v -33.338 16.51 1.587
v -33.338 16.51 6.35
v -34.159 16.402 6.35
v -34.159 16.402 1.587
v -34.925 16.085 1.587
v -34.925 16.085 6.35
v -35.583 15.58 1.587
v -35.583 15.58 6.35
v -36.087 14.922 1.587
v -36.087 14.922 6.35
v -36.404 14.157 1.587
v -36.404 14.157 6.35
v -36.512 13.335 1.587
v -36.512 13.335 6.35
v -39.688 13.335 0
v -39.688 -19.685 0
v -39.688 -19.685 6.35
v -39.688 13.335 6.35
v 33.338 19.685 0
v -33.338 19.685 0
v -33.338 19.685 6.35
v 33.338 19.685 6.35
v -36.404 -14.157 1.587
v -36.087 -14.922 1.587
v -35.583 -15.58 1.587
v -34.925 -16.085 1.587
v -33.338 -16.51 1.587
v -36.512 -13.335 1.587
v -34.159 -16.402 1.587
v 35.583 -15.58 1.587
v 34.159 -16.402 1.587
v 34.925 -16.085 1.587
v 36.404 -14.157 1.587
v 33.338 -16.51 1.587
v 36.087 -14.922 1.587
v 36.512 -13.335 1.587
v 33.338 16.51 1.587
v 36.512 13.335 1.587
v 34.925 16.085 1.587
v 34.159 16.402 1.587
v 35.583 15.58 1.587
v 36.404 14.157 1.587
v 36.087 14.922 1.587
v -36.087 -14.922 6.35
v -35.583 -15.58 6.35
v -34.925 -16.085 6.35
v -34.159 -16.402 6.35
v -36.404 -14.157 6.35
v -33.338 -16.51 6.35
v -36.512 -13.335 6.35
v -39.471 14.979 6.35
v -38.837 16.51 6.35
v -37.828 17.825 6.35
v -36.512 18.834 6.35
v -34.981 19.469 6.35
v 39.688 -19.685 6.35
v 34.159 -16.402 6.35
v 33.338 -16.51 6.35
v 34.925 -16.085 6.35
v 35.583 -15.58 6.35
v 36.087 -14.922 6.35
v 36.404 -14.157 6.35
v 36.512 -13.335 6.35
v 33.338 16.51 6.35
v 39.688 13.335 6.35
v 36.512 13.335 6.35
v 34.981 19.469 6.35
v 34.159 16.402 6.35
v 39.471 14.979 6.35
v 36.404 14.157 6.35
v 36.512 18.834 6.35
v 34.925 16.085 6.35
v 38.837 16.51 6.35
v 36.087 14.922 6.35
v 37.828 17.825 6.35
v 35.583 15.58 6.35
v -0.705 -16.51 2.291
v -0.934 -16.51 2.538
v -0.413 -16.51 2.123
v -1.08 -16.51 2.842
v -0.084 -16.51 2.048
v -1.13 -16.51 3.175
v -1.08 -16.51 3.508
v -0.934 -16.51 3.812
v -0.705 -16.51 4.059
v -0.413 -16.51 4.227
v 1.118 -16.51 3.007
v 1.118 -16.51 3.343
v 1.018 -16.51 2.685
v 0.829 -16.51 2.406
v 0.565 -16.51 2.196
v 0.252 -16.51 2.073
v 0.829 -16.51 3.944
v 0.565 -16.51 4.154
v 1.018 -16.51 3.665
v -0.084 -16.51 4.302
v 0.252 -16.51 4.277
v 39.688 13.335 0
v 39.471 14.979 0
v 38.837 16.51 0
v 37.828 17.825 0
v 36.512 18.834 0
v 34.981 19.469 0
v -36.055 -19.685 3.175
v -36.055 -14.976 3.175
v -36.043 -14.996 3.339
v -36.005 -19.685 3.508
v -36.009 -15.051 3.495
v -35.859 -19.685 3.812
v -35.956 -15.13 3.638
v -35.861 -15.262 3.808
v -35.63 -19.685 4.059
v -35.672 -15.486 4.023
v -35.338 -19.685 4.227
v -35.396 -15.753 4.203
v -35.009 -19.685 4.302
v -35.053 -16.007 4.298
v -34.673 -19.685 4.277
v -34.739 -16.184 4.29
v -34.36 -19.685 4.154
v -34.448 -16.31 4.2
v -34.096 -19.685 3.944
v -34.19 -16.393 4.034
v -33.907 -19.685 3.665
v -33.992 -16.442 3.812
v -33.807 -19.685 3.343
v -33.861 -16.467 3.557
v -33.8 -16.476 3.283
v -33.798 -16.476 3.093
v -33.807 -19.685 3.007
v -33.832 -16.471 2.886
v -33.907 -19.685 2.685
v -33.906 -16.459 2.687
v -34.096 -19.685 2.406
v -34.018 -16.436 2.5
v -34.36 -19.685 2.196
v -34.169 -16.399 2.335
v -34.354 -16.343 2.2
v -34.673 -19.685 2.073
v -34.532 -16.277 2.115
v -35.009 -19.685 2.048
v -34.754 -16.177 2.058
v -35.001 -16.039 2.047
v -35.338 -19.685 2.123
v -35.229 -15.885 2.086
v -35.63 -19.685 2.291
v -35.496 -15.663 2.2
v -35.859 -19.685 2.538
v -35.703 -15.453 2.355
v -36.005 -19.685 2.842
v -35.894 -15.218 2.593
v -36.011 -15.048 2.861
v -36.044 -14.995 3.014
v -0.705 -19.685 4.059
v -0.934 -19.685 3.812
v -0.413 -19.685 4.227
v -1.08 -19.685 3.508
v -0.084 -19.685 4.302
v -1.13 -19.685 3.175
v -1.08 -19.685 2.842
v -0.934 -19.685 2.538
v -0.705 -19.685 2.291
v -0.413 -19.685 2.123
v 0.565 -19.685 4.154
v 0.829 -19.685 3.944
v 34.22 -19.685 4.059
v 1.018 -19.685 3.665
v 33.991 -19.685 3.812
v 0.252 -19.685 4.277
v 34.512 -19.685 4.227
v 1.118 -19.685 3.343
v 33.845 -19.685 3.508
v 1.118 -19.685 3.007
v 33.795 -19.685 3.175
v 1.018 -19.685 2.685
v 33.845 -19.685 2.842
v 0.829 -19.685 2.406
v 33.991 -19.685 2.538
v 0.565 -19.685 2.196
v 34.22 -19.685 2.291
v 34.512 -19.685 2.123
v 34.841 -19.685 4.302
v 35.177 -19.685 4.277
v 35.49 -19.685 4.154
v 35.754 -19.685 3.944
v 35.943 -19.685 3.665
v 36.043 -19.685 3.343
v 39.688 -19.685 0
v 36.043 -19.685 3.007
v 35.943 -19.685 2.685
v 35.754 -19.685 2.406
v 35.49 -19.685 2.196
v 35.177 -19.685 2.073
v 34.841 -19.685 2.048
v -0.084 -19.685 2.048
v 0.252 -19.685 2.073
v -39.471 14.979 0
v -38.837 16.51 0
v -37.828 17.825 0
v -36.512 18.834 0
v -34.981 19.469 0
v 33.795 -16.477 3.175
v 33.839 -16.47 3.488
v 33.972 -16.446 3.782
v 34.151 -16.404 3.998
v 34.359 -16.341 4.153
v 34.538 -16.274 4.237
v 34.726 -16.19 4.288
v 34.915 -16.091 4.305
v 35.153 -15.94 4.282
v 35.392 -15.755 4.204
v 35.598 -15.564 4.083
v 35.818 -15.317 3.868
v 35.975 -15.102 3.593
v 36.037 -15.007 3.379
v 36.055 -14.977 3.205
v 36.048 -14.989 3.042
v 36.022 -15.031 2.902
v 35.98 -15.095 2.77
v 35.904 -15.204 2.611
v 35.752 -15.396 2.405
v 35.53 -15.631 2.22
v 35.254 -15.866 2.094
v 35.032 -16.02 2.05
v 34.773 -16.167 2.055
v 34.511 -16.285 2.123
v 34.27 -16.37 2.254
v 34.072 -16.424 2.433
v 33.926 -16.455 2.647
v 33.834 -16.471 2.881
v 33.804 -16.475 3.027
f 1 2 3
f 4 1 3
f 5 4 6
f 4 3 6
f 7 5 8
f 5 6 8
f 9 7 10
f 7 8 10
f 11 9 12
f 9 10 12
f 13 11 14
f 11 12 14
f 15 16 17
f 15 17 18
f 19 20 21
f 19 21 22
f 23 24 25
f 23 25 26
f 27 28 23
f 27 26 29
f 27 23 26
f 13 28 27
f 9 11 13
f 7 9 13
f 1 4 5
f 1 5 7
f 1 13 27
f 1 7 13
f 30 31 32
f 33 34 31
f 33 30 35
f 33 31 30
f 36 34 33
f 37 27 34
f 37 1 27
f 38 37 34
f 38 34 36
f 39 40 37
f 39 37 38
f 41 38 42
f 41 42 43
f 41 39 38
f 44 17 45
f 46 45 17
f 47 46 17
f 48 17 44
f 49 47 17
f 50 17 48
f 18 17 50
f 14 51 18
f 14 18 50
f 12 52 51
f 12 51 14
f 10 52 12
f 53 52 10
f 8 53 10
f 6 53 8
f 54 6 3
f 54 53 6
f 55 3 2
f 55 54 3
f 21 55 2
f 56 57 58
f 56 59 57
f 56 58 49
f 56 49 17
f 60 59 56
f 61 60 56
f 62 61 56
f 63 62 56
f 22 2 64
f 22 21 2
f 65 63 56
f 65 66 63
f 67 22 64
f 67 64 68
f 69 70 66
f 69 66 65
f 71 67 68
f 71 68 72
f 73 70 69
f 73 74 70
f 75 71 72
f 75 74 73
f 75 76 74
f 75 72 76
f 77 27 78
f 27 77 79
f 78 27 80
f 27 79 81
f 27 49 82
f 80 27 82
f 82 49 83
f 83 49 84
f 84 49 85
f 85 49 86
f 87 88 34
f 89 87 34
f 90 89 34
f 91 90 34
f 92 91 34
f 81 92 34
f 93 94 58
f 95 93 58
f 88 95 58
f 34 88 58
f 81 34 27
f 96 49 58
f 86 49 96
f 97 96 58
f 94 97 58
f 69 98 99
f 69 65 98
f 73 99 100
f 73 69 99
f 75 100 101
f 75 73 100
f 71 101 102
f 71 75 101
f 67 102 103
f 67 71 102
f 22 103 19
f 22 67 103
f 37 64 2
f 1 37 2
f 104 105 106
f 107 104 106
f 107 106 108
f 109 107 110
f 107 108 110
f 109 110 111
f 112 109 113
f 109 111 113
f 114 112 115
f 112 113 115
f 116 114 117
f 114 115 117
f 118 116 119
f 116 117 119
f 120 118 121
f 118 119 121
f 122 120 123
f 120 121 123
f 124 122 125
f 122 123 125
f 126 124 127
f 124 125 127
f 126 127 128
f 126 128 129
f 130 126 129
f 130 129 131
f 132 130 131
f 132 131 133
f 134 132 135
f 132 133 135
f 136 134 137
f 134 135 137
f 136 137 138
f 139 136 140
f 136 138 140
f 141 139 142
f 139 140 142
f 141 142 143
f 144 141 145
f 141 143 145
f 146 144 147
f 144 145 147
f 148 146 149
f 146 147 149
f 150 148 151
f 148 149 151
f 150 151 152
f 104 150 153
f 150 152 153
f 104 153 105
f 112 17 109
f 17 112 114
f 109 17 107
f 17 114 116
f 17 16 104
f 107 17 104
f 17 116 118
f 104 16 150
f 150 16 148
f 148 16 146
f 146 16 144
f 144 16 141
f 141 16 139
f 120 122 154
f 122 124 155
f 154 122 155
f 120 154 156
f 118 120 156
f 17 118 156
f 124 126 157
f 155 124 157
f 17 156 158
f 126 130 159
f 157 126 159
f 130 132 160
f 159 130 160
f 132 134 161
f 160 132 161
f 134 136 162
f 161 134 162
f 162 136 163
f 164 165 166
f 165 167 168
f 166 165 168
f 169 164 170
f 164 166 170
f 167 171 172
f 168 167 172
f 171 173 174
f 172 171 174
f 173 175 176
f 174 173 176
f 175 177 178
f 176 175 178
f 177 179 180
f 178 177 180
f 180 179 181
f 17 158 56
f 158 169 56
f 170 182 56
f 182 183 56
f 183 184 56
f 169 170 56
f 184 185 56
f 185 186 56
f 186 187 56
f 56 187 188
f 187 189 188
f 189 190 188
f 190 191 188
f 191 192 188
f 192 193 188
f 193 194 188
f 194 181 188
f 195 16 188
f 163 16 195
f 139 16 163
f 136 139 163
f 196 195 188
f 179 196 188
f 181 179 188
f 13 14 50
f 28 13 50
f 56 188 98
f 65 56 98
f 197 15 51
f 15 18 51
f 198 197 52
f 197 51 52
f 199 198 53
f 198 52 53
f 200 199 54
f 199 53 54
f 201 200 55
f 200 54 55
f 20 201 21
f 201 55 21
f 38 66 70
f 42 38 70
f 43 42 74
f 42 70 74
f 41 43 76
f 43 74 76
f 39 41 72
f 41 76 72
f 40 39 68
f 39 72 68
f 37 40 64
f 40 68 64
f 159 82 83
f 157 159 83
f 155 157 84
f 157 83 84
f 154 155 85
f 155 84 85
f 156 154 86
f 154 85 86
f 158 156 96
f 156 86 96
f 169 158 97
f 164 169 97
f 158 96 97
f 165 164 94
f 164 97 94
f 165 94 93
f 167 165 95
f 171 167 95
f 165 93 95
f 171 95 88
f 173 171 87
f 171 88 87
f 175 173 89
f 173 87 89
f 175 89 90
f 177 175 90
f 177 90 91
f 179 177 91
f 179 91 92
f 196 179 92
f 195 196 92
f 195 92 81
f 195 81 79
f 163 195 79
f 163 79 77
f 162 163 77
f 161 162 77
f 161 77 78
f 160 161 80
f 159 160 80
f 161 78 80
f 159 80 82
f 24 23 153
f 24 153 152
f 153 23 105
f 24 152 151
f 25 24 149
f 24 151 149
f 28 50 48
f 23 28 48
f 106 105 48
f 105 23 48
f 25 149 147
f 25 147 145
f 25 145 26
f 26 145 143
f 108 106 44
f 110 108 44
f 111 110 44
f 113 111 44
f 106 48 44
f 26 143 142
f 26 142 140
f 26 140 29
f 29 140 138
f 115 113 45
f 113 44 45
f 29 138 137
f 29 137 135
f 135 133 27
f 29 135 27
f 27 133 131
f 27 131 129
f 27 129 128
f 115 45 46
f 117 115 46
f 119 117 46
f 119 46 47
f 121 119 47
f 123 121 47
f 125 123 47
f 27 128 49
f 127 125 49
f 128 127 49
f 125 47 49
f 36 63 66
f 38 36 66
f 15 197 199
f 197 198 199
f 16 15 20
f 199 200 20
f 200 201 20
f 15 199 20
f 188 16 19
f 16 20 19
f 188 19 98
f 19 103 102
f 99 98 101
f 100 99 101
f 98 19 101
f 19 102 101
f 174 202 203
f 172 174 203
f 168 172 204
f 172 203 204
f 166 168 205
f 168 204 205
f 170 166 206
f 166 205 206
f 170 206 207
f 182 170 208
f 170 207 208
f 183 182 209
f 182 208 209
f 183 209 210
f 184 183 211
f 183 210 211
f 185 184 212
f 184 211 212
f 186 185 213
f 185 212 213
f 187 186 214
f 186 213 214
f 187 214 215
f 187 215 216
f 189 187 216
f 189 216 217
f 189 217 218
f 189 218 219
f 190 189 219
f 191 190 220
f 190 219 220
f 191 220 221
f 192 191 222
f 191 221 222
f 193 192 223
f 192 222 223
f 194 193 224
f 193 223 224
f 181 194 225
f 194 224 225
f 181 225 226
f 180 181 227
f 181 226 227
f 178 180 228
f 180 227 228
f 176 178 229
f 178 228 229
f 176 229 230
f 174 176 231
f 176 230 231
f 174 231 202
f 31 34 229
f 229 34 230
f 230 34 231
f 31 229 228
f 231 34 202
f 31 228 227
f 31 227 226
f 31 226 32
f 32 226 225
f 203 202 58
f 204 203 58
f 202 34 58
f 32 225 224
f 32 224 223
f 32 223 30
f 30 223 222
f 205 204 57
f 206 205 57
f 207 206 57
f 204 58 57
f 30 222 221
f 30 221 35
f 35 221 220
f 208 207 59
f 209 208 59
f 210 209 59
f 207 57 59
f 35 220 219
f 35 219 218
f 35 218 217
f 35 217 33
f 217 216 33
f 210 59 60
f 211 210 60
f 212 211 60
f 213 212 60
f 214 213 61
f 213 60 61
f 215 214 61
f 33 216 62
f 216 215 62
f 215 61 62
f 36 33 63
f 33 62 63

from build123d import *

# Parameters (mm, degrees)
SKETCH1_W                 = 79.375
SKETCH1_H                 = 39.37
BOSS_EXTRUDE1_DEPTH       = 6.35
FILLET1_R                 = 6.35
F_4_40_TAPPED_HOLE1_D     = 2.2606
F_4_40_TAPPED_HOLE1_DEPTH = 7.62
F_4_40_TAPPED_HOLE1_TIP   = 0.679152758
CUT_EXTRUDE1_DEPTH        = 4.7625


with BuildPart() as part:
    # Sketch1 → Boss-Extrude1 (new body)
    with BuildSketch(Plane.XY):
        Rectangle(SKETCH1_W, SKETCH1_H)
    extrude(amount=BOSS_EXTRUDE1_DEPTH)

    # Fillet1
    fillet1_edges = [part.edges().sort_by_distance(p)[0] for p in [
        (-39.6875, 19.685, 3.175),
        (39.6875, 19.685, 3.175),
    ]]
    fillet(fillet1_edges, radius=FILLET1_R)

    # #4-40 Tapped Hole1
    with Locations(Plane.XZ.offset(19.685)):
        with Locations((0, 3.175), (-34.925, 3.175), (34.925, 3.175)):
            Hole(F_4_40_TAPPED_HOLE1_D / 2, depth=F_4_40_TAPPED_HOLE1_DEPTH)
            with Locations((0, 0, -(F_4_40_TAPPED_HOLE1_DEPTH + F_4_40_TAPPED_HOLE1_TIP / 2))):  # 118° drill point
                Cone(0, F_4_40_TAPPED_HOLE1_D / 2, F_4_40_TAPPED_HOLE1_TIP, mode=Mode.SUBTRACT)

    # Sketch5 → Cut-Extrude1 (cut)
    with BuildSketch(Plane.XY.offset(6.35)):
        with BuildLine():
            Line((36.5125, -13.335), (36.5125, 13.335))
            ThreePointArc((36.5125, 13.335), (35.58256403, 15.58006403), (33.3375, 16.51))
            Line((33.3375, 16.51), (-33.3375, 16.51))
            ThreePointArc((-33.3375, 16.51), (-35.58256403, 15.58006403), (-36.5125, 13.335))
            Line((-36.5125, 13.335), (-36.5125, -13.335))
            ThreePointArc((-36.5125, -13.335), (-35.58256403, -15.58006403), (-33.3375, -16.51))
            Line((-33.3375, -16.51), (33.3375, -16.51))
            ThreePointArc((33.3375, -16.51), (35.58256403, -15.58006403), (36.5125, -13.335))
        make_face()
    extrude(amount=-CUT_EXTRUDE1_DEPTH, mode=Mode.SUBTRACT)


solid = part.part
